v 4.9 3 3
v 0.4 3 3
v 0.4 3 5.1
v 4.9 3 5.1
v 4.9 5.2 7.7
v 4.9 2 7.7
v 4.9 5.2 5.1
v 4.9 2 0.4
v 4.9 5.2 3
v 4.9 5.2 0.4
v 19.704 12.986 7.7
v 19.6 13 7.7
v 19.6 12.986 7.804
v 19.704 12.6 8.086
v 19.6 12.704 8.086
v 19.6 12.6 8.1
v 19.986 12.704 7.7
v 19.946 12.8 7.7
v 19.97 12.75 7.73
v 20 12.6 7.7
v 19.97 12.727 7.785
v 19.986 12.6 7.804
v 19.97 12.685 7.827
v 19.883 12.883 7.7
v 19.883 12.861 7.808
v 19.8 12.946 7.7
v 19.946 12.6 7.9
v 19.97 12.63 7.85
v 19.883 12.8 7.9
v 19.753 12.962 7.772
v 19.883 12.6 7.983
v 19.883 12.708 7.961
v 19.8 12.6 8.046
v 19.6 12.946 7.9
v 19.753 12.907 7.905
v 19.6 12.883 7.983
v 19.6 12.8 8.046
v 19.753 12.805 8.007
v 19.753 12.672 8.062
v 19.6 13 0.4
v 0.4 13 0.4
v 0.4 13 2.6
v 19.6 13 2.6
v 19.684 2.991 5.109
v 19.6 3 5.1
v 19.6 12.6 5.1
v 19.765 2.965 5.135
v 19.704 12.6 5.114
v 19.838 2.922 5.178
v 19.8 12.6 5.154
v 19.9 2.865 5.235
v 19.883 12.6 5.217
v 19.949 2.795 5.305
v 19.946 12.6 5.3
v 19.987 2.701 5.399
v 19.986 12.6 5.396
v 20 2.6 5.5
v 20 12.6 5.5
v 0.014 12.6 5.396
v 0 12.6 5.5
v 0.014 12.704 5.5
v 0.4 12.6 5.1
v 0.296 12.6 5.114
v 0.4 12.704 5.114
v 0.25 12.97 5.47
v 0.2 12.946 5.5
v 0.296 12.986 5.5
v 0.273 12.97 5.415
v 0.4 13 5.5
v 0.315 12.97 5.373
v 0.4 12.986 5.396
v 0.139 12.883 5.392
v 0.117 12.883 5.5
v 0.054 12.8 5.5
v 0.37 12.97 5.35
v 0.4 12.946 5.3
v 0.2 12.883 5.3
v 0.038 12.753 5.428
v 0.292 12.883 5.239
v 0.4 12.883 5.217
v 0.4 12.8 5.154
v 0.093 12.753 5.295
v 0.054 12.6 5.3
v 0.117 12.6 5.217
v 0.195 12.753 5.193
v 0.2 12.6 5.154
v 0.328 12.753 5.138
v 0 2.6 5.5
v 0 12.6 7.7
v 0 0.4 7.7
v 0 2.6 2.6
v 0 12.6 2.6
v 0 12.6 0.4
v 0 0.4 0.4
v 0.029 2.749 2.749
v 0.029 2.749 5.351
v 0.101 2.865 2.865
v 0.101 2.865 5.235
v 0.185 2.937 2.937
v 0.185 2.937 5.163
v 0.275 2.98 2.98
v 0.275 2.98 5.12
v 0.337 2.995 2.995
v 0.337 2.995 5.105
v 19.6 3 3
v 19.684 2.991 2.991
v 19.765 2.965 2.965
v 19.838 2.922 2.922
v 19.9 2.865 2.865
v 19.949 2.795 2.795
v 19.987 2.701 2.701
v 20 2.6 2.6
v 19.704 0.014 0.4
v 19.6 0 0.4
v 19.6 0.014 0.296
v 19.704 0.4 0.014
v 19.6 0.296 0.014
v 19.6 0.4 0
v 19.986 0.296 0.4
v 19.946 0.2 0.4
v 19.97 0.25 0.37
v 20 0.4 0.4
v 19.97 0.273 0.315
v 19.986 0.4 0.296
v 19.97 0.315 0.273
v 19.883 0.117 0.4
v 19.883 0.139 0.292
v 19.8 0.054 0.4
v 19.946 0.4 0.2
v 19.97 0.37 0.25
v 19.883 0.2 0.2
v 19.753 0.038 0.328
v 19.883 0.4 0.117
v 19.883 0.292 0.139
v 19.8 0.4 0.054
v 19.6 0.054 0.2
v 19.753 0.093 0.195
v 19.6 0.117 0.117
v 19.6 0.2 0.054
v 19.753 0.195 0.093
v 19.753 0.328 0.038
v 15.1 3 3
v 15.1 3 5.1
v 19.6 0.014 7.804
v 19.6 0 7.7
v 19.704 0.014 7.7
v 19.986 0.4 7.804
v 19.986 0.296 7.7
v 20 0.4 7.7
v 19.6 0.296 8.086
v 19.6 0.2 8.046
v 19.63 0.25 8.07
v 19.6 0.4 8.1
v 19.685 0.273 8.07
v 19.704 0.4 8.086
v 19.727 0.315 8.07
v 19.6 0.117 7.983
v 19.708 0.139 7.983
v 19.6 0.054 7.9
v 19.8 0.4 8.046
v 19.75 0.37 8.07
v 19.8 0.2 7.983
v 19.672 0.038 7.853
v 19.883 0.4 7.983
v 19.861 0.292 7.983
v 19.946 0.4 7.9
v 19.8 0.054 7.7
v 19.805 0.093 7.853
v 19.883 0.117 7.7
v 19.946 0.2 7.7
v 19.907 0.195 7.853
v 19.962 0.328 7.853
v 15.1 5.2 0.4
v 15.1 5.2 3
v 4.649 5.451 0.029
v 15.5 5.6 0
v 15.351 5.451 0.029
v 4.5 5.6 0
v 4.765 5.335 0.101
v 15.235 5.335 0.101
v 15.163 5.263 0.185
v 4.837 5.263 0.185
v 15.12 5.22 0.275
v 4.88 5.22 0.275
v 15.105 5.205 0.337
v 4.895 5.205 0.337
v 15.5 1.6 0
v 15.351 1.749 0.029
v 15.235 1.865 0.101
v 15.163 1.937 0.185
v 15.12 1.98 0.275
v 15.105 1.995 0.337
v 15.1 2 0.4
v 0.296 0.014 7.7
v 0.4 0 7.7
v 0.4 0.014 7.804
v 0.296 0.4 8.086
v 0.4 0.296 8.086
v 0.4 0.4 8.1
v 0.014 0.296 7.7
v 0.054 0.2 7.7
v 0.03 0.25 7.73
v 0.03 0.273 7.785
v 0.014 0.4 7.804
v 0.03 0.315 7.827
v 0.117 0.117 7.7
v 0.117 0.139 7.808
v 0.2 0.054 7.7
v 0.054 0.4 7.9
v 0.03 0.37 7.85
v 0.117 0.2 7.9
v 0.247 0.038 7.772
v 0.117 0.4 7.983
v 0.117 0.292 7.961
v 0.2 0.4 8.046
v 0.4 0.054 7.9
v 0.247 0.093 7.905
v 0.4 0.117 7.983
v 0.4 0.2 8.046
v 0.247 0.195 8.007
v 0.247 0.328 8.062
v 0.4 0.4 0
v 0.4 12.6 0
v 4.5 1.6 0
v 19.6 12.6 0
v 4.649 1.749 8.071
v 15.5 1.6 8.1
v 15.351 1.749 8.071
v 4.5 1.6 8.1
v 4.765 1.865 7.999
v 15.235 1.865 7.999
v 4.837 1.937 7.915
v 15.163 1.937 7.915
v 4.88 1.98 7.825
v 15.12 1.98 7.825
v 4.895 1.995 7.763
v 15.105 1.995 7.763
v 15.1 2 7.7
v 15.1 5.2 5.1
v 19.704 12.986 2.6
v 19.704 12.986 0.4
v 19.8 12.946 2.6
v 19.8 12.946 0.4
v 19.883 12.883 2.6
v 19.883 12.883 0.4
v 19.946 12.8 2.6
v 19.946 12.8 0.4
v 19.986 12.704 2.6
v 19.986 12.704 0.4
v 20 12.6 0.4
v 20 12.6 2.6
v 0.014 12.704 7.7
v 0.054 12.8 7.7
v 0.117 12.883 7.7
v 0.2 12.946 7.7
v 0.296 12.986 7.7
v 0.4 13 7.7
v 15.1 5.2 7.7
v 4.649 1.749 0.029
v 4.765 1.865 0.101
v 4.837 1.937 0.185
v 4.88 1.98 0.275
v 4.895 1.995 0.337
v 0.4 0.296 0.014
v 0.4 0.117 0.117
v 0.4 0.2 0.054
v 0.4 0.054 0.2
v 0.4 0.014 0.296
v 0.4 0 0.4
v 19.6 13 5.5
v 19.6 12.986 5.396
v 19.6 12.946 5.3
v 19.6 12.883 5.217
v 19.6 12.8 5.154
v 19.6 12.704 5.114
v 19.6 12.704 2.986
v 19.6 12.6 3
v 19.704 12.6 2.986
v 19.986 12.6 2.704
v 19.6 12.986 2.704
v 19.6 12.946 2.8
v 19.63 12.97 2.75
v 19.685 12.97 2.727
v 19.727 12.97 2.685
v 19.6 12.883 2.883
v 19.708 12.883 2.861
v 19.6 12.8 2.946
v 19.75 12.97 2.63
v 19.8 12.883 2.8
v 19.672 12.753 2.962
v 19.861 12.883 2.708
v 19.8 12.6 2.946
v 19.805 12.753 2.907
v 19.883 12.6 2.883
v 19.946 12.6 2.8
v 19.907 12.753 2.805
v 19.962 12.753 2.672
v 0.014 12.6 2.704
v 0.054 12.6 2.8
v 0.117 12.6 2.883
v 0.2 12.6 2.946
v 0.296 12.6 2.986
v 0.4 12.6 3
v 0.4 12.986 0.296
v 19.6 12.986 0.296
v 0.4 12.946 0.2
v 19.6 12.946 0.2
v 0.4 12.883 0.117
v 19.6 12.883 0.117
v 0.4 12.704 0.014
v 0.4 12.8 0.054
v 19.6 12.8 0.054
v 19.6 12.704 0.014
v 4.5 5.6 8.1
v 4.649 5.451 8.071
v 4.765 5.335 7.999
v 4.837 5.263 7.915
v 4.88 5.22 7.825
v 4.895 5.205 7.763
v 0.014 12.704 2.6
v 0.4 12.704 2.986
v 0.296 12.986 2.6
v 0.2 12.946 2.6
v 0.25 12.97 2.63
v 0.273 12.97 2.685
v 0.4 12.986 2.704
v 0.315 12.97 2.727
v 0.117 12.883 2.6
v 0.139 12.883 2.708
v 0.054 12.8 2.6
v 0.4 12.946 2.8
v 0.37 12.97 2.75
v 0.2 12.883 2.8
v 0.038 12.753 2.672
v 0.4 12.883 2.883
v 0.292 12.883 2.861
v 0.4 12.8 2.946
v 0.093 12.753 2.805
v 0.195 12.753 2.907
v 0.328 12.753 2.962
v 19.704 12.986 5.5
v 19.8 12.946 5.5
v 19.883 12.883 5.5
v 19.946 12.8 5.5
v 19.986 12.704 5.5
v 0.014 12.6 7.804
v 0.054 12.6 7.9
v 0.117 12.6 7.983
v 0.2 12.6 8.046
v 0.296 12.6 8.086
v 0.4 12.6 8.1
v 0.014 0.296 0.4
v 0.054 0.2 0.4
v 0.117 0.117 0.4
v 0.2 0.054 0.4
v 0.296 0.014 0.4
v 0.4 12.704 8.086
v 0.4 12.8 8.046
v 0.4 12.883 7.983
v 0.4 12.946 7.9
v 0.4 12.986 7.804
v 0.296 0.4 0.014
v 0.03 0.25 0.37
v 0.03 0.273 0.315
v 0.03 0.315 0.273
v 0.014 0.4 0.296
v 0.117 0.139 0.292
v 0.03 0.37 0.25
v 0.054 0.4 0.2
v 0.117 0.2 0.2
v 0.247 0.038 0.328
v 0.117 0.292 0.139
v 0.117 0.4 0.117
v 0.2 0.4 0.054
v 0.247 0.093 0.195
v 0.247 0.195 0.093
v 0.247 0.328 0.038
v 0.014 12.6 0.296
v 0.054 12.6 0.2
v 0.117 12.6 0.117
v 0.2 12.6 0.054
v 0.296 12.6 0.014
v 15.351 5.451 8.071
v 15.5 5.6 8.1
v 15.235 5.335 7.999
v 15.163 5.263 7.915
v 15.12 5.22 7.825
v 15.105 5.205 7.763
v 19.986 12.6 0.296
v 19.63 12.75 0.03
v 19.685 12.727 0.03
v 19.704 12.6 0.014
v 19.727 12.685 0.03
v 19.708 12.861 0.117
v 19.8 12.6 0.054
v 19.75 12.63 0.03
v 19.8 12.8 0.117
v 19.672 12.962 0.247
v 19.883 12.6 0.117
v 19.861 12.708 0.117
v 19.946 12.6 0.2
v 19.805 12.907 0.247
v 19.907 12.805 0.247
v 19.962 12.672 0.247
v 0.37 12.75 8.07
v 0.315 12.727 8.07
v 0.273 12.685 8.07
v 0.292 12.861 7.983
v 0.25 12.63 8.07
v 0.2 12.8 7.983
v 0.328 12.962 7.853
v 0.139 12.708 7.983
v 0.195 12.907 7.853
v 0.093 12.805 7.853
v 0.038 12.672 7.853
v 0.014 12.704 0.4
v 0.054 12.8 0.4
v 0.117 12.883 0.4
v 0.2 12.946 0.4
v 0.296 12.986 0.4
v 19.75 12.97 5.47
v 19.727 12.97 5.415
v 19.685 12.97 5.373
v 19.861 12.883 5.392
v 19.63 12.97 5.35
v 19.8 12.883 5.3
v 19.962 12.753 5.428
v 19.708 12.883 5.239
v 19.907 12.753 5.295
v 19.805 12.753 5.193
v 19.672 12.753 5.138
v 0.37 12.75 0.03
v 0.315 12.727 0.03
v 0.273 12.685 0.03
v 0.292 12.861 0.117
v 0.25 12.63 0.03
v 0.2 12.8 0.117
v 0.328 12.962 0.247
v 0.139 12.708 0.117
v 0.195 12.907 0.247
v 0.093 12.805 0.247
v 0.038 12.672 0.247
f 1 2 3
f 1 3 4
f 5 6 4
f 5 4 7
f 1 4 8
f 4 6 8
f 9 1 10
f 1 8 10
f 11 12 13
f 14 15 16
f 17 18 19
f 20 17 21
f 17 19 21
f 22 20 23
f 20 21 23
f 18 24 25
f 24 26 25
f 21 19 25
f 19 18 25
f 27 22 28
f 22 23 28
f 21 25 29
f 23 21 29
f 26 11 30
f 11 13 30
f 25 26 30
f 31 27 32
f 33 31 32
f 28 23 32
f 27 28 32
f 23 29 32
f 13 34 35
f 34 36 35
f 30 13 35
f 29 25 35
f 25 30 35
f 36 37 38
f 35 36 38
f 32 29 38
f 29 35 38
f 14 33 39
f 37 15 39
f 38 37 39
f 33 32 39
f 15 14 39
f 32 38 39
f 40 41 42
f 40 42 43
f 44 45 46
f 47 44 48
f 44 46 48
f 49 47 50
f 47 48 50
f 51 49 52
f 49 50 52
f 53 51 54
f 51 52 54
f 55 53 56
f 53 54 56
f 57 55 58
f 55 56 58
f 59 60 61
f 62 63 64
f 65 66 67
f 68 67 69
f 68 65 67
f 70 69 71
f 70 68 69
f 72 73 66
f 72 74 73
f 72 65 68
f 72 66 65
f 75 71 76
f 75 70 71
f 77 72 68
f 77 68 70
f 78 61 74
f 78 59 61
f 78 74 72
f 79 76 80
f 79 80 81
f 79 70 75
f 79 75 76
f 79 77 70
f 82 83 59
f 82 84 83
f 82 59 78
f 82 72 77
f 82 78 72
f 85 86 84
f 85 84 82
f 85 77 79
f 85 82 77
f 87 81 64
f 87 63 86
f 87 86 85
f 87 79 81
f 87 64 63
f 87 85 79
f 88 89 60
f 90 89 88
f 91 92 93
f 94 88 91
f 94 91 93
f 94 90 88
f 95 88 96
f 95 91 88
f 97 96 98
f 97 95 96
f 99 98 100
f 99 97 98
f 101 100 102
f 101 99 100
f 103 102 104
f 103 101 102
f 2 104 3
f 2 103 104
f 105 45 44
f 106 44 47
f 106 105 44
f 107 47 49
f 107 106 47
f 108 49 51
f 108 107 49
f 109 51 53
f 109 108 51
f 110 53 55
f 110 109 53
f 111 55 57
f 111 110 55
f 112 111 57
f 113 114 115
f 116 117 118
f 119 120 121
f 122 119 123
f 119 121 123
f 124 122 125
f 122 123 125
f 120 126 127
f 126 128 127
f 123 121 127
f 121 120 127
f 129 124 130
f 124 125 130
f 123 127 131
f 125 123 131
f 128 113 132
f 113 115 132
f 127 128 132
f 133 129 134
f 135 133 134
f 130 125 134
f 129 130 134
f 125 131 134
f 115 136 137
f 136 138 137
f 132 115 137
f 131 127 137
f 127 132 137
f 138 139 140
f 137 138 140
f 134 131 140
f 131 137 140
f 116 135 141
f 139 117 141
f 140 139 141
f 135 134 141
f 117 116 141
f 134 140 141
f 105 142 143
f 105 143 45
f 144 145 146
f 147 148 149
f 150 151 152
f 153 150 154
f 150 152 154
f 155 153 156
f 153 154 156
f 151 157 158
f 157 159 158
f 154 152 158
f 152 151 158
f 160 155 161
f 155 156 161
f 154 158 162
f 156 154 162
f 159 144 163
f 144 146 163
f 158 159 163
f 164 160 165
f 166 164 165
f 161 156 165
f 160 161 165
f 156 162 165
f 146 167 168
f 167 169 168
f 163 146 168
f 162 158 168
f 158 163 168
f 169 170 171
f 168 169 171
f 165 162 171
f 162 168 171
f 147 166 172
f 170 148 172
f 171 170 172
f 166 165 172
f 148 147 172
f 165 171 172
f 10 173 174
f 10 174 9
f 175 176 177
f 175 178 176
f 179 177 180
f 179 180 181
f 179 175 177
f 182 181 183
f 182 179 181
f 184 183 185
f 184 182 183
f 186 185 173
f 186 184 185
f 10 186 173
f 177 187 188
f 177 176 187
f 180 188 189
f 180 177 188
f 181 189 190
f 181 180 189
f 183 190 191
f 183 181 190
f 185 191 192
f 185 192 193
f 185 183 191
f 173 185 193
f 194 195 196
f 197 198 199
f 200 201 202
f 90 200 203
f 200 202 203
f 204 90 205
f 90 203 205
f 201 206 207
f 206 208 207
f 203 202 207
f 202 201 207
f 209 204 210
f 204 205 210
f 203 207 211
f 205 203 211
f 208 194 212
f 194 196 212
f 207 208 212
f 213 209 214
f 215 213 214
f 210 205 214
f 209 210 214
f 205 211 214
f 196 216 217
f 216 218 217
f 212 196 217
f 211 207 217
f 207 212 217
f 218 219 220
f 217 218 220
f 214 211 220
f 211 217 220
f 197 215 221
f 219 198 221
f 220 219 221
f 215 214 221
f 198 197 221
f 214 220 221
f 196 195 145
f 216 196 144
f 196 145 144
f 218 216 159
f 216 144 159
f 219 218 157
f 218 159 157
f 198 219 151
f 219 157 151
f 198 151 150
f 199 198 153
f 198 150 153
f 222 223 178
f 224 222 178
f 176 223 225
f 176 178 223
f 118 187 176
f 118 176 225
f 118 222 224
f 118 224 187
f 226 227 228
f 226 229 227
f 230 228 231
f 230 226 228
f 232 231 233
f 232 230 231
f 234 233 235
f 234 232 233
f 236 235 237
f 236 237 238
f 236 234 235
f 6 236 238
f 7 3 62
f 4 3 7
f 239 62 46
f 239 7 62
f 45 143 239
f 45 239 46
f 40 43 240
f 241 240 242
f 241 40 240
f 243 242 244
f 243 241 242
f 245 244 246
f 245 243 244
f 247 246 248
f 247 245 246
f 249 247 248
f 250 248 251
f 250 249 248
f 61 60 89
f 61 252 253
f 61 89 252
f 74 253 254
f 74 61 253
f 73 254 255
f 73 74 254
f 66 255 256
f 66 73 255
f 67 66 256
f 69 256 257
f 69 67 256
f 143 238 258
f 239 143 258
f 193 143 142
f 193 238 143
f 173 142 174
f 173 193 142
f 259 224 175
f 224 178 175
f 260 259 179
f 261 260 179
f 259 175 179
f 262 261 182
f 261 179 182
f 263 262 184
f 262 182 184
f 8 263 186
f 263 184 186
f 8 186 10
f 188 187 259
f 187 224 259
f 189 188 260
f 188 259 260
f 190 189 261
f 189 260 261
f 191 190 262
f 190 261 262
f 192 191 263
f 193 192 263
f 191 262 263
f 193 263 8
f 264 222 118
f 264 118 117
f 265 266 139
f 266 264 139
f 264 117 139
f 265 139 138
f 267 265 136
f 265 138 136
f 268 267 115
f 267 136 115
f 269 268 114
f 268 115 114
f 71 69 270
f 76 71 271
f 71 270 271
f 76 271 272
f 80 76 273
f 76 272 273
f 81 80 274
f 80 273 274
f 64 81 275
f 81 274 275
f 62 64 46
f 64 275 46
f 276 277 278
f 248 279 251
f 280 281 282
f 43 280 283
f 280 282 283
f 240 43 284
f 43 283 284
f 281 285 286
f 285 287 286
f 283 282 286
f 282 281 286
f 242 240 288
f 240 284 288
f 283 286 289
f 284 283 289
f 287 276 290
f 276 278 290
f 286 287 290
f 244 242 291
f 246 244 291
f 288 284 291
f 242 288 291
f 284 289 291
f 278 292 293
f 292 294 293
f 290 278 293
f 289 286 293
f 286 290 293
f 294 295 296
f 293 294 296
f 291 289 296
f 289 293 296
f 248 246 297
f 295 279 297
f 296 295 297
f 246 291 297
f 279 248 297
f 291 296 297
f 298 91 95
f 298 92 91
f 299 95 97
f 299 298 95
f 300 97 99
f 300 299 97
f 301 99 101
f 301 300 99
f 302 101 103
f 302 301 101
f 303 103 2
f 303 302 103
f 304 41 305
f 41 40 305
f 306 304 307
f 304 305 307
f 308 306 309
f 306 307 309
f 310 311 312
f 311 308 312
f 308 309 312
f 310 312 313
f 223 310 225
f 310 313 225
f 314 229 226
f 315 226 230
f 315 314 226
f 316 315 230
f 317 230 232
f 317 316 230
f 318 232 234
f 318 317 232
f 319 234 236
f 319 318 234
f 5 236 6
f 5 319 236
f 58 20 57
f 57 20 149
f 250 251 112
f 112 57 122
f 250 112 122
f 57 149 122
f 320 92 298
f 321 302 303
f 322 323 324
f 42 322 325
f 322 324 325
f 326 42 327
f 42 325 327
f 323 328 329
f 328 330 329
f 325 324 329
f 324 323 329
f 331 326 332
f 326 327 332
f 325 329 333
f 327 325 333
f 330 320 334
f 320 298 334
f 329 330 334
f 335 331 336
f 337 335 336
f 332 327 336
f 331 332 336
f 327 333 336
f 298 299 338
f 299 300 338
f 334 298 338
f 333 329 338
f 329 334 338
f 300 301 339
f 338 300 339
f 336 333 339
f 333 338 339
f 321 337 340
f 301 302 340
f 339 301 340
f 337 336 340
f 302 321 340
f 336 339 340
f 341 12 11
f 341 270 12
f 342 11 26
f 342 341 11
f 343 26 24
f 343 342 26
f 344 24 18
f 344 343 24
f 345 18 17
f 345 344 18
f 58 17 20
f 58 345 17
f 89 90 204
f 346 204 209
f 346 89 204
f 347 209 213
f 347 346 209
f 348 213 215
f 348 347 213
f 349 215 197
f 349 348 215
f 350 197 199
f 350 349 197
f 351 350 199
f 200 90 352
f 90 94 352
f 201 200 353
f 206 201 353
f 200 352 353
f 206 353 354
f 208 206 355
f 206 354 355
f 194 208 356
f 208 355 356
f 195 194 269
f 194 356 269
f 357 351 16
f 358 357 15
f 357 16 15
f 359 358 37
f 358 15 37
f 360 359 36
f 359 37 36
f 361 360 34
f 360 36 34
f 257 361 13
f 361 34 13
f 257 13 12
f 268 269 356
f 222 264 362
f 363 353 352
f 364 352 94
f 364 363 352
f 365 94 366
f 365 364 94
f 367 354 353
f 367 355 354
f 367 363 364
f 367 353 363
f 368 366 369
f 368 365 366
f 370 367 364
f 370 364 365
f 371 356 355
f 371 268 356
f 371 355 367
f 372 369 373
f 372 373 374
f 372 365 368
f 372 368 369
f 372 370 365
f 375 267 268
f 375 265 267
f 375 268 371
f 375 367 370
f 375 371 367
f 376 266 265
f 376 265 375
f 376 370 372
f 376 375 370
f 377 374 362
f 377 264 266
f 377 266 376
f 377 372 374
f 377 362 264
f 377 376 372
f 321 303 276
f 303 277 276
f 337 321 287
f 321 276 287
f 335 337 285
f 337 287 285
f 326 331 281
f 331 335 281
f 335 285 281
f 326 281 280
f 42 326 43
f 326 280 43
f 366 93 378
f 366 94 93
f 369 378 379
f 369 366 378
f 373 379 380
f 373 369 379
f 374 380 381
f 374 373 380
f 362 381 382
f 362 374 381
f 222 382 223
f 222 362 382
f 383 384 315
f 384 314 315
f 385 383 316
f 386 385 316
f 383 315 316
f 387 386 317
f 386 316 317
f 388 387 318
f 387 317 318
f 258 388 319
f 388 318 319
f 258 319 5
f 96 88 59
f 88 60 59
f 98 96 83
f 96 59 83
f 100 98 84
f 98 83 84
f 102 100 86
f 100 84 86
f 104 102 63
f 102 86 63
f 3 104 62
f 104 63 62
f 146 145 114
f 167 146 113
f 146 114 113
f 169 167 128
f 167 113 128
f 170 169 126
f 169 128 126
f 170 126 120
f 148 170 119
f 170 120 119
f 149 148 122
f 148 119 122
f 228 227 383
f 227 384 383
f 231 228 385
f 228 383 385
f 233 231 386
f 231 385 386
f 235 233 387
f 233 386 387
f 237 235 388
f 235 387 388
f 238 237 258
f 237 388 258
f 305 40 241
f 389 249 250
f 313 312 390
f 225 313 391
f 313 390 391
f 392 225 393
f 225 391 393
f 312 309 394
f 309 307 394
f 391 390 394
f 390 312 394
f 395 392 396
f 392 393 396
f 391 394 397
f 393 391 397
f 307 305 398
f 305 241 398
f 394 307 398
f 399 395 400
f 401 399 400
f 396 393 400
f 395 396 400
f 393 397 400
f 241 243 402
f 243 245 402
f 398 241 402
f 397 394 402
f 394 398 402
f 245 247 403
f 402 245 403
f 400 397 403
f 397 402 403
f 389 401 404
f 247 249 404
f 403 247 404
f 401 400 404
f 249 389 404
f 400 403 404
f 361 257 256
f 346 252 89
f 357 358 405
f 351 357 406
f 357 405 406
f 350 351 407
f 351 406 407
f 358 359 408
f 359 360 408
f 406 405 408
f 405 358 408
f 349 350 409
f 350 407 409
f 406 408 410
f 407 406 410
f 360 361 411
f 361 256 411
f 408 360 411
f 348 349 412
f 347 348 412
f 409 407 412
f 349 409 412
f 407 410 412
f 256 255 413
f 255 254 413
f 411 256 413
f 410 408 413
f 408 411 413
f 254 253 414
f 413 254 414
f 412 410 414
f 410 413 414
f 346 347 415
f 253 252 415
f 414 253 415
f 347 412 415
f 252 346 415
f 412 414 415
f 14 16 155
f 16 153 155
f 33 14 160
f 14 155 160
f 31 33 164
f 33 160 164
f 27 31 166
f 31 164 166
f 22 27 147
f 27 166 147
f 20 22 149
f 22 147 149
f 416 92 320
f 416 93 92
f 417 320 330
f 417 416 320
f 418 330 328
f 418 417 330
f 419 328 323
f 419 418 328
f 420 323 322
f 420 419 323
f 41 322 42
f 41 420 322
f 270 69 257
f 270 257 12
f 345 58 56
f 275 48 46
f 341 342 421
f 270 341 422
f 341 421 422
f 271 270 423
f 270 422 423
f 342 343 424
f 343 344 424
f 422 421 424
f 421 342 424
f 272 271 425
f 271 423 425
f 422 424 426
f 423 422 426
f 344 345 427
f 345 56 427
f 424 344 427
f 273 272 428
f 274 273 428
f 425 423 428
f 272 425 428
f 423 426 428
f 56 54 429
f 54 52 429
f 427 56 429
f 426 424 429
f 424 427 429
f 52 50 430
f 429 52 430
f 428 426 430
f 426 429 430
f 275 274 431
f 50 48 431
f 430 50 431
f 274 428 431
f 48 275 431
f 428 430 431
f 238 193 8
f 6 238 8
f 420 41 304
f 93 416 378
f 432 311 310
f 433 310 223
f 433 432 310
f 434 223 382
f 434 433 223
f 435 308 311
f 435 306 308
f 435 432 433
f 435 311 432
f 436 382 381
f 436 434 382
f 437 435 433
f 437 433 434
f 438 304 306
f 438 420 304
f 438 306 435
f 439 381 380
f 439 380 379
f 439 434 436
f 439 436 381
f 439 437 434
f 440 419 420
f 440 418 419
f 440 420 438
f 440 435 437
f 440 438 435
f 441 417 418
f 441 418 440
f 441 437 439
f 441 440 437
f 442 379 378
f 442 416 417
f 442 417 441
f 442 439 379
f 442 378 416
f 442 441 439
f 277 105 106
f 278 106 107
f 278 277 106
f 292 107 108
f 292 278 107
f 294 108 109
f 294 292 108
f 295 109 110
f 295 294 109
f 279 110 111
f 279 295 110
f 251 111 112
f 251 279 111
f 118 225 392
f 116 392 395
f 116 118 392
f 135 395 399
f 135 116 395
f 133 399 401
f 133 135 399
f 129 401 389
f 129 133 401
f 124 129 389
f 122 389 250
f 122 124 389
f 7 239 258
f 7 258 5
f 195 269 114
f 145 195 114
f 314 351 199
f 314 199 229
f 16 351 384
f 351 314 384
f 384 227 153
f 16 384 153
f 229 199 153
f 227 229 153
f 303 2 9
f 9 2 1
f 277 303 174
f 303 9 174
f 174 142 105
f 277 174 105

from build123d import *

# Parameters (mm, degrees)
SKETCH1_W           = 20
SKETCH1_H           = 8.1
BOSS_EXTRUDE1_DEPTH = 3
SKETCH2_W           = 20
SKETCH2_H           = 3
BOSS_EXTRUDE2_DEPTH = 10
SKETCH3_W           = 10.2
SKETCH3_H           = 3.2
CUT_EXTRUDE1_DEPTH  = 26.191466809
FILLET1_R           = 0.4


with BuildPart() as part:
    # Sketch1 → Boss-Extrude1 (new body)
    with BuildSketch(Plane(origin=(0, 0, 0), x_dir=(1, 0, 0), z_dir=(0, 1, 0))):
        with Locations((10, -4.05)):
            Rectangle(SKETCH1_W, SKETCH1_H)
    extrude(amount=BOSS_EXTRUDE1_DEPTH)

    # Sketch2 → Boss-Extrude2 (add)
    with BuildSketch(Plane(origin=(0, 3, 0), x_dir=(1, 0, 0), z_dir=(0, 1, 0))):
        with Locations((10, -1.5)):
            Rectangle(SKETCH2_W, SKETCH2_H)
        with Locations((10, -6.6)):
            Rectangle(SKETCH2_W, SKETCH2_H)
    extrude(amount=BOSS_EXTRUDE2_DEPTH)

    # Sketch3 → Cut-Extrude1 (cut, through all)
    with BuildSketch(Plane(origin=(0, 0, 0), x_dir=(-1, 0, 0), z_dir=(0, 0, -1))):
        with Locations((-10, 3.6)):
            Rectangle(SKETCH3_W, SKETCH3_H)
    extrude(amount=-CUT_EXTRUDE1_DEPTH, mode=Mode.SUBTRACT)

    # Fillet1
    fillet1_edges = [part.edges().sort_by_distance(p)[0] for p in [
        (0, 3, 4.05),
        (0, 8, 3),
        (20, 8, 3),
        (0, 13, 1.5),
        (10, 13, 3),
        (20, 13, 1.5),
        (10, 13, 0),
        (20, 3, 4.05),
        (0, 8, 5.1),
        (20, 8, 5.1),
        (0, 13, 6.6),
        (10, 13, 8.1),
        (20, 13, 6.6),
        (10, 13, 5.1),
        (15.1, 3.6, 8.1),
        (10, 5.2, 8.1),
        (4.9, 3.6, 8.1),
        (10, 2, 8.1),
        (15.1, 3.6, 0),
        (10, 2, 0),
        (4.9, 3.6, 0),
        (10, 0, 0),
        (10, 5.2, 0),
        (20, 0, 4.05),
        (10, 0, 8.1),
        (0, 0, 4.05),
        (0, 6.5, 0),
        (20, 6.5, 0),
        (20, 6.5, 8.1),
        (0, 6.5, 8.1),
    ]]
    fillet(fillet1_edges, radius=FILLET1_R)


solid = part.part
